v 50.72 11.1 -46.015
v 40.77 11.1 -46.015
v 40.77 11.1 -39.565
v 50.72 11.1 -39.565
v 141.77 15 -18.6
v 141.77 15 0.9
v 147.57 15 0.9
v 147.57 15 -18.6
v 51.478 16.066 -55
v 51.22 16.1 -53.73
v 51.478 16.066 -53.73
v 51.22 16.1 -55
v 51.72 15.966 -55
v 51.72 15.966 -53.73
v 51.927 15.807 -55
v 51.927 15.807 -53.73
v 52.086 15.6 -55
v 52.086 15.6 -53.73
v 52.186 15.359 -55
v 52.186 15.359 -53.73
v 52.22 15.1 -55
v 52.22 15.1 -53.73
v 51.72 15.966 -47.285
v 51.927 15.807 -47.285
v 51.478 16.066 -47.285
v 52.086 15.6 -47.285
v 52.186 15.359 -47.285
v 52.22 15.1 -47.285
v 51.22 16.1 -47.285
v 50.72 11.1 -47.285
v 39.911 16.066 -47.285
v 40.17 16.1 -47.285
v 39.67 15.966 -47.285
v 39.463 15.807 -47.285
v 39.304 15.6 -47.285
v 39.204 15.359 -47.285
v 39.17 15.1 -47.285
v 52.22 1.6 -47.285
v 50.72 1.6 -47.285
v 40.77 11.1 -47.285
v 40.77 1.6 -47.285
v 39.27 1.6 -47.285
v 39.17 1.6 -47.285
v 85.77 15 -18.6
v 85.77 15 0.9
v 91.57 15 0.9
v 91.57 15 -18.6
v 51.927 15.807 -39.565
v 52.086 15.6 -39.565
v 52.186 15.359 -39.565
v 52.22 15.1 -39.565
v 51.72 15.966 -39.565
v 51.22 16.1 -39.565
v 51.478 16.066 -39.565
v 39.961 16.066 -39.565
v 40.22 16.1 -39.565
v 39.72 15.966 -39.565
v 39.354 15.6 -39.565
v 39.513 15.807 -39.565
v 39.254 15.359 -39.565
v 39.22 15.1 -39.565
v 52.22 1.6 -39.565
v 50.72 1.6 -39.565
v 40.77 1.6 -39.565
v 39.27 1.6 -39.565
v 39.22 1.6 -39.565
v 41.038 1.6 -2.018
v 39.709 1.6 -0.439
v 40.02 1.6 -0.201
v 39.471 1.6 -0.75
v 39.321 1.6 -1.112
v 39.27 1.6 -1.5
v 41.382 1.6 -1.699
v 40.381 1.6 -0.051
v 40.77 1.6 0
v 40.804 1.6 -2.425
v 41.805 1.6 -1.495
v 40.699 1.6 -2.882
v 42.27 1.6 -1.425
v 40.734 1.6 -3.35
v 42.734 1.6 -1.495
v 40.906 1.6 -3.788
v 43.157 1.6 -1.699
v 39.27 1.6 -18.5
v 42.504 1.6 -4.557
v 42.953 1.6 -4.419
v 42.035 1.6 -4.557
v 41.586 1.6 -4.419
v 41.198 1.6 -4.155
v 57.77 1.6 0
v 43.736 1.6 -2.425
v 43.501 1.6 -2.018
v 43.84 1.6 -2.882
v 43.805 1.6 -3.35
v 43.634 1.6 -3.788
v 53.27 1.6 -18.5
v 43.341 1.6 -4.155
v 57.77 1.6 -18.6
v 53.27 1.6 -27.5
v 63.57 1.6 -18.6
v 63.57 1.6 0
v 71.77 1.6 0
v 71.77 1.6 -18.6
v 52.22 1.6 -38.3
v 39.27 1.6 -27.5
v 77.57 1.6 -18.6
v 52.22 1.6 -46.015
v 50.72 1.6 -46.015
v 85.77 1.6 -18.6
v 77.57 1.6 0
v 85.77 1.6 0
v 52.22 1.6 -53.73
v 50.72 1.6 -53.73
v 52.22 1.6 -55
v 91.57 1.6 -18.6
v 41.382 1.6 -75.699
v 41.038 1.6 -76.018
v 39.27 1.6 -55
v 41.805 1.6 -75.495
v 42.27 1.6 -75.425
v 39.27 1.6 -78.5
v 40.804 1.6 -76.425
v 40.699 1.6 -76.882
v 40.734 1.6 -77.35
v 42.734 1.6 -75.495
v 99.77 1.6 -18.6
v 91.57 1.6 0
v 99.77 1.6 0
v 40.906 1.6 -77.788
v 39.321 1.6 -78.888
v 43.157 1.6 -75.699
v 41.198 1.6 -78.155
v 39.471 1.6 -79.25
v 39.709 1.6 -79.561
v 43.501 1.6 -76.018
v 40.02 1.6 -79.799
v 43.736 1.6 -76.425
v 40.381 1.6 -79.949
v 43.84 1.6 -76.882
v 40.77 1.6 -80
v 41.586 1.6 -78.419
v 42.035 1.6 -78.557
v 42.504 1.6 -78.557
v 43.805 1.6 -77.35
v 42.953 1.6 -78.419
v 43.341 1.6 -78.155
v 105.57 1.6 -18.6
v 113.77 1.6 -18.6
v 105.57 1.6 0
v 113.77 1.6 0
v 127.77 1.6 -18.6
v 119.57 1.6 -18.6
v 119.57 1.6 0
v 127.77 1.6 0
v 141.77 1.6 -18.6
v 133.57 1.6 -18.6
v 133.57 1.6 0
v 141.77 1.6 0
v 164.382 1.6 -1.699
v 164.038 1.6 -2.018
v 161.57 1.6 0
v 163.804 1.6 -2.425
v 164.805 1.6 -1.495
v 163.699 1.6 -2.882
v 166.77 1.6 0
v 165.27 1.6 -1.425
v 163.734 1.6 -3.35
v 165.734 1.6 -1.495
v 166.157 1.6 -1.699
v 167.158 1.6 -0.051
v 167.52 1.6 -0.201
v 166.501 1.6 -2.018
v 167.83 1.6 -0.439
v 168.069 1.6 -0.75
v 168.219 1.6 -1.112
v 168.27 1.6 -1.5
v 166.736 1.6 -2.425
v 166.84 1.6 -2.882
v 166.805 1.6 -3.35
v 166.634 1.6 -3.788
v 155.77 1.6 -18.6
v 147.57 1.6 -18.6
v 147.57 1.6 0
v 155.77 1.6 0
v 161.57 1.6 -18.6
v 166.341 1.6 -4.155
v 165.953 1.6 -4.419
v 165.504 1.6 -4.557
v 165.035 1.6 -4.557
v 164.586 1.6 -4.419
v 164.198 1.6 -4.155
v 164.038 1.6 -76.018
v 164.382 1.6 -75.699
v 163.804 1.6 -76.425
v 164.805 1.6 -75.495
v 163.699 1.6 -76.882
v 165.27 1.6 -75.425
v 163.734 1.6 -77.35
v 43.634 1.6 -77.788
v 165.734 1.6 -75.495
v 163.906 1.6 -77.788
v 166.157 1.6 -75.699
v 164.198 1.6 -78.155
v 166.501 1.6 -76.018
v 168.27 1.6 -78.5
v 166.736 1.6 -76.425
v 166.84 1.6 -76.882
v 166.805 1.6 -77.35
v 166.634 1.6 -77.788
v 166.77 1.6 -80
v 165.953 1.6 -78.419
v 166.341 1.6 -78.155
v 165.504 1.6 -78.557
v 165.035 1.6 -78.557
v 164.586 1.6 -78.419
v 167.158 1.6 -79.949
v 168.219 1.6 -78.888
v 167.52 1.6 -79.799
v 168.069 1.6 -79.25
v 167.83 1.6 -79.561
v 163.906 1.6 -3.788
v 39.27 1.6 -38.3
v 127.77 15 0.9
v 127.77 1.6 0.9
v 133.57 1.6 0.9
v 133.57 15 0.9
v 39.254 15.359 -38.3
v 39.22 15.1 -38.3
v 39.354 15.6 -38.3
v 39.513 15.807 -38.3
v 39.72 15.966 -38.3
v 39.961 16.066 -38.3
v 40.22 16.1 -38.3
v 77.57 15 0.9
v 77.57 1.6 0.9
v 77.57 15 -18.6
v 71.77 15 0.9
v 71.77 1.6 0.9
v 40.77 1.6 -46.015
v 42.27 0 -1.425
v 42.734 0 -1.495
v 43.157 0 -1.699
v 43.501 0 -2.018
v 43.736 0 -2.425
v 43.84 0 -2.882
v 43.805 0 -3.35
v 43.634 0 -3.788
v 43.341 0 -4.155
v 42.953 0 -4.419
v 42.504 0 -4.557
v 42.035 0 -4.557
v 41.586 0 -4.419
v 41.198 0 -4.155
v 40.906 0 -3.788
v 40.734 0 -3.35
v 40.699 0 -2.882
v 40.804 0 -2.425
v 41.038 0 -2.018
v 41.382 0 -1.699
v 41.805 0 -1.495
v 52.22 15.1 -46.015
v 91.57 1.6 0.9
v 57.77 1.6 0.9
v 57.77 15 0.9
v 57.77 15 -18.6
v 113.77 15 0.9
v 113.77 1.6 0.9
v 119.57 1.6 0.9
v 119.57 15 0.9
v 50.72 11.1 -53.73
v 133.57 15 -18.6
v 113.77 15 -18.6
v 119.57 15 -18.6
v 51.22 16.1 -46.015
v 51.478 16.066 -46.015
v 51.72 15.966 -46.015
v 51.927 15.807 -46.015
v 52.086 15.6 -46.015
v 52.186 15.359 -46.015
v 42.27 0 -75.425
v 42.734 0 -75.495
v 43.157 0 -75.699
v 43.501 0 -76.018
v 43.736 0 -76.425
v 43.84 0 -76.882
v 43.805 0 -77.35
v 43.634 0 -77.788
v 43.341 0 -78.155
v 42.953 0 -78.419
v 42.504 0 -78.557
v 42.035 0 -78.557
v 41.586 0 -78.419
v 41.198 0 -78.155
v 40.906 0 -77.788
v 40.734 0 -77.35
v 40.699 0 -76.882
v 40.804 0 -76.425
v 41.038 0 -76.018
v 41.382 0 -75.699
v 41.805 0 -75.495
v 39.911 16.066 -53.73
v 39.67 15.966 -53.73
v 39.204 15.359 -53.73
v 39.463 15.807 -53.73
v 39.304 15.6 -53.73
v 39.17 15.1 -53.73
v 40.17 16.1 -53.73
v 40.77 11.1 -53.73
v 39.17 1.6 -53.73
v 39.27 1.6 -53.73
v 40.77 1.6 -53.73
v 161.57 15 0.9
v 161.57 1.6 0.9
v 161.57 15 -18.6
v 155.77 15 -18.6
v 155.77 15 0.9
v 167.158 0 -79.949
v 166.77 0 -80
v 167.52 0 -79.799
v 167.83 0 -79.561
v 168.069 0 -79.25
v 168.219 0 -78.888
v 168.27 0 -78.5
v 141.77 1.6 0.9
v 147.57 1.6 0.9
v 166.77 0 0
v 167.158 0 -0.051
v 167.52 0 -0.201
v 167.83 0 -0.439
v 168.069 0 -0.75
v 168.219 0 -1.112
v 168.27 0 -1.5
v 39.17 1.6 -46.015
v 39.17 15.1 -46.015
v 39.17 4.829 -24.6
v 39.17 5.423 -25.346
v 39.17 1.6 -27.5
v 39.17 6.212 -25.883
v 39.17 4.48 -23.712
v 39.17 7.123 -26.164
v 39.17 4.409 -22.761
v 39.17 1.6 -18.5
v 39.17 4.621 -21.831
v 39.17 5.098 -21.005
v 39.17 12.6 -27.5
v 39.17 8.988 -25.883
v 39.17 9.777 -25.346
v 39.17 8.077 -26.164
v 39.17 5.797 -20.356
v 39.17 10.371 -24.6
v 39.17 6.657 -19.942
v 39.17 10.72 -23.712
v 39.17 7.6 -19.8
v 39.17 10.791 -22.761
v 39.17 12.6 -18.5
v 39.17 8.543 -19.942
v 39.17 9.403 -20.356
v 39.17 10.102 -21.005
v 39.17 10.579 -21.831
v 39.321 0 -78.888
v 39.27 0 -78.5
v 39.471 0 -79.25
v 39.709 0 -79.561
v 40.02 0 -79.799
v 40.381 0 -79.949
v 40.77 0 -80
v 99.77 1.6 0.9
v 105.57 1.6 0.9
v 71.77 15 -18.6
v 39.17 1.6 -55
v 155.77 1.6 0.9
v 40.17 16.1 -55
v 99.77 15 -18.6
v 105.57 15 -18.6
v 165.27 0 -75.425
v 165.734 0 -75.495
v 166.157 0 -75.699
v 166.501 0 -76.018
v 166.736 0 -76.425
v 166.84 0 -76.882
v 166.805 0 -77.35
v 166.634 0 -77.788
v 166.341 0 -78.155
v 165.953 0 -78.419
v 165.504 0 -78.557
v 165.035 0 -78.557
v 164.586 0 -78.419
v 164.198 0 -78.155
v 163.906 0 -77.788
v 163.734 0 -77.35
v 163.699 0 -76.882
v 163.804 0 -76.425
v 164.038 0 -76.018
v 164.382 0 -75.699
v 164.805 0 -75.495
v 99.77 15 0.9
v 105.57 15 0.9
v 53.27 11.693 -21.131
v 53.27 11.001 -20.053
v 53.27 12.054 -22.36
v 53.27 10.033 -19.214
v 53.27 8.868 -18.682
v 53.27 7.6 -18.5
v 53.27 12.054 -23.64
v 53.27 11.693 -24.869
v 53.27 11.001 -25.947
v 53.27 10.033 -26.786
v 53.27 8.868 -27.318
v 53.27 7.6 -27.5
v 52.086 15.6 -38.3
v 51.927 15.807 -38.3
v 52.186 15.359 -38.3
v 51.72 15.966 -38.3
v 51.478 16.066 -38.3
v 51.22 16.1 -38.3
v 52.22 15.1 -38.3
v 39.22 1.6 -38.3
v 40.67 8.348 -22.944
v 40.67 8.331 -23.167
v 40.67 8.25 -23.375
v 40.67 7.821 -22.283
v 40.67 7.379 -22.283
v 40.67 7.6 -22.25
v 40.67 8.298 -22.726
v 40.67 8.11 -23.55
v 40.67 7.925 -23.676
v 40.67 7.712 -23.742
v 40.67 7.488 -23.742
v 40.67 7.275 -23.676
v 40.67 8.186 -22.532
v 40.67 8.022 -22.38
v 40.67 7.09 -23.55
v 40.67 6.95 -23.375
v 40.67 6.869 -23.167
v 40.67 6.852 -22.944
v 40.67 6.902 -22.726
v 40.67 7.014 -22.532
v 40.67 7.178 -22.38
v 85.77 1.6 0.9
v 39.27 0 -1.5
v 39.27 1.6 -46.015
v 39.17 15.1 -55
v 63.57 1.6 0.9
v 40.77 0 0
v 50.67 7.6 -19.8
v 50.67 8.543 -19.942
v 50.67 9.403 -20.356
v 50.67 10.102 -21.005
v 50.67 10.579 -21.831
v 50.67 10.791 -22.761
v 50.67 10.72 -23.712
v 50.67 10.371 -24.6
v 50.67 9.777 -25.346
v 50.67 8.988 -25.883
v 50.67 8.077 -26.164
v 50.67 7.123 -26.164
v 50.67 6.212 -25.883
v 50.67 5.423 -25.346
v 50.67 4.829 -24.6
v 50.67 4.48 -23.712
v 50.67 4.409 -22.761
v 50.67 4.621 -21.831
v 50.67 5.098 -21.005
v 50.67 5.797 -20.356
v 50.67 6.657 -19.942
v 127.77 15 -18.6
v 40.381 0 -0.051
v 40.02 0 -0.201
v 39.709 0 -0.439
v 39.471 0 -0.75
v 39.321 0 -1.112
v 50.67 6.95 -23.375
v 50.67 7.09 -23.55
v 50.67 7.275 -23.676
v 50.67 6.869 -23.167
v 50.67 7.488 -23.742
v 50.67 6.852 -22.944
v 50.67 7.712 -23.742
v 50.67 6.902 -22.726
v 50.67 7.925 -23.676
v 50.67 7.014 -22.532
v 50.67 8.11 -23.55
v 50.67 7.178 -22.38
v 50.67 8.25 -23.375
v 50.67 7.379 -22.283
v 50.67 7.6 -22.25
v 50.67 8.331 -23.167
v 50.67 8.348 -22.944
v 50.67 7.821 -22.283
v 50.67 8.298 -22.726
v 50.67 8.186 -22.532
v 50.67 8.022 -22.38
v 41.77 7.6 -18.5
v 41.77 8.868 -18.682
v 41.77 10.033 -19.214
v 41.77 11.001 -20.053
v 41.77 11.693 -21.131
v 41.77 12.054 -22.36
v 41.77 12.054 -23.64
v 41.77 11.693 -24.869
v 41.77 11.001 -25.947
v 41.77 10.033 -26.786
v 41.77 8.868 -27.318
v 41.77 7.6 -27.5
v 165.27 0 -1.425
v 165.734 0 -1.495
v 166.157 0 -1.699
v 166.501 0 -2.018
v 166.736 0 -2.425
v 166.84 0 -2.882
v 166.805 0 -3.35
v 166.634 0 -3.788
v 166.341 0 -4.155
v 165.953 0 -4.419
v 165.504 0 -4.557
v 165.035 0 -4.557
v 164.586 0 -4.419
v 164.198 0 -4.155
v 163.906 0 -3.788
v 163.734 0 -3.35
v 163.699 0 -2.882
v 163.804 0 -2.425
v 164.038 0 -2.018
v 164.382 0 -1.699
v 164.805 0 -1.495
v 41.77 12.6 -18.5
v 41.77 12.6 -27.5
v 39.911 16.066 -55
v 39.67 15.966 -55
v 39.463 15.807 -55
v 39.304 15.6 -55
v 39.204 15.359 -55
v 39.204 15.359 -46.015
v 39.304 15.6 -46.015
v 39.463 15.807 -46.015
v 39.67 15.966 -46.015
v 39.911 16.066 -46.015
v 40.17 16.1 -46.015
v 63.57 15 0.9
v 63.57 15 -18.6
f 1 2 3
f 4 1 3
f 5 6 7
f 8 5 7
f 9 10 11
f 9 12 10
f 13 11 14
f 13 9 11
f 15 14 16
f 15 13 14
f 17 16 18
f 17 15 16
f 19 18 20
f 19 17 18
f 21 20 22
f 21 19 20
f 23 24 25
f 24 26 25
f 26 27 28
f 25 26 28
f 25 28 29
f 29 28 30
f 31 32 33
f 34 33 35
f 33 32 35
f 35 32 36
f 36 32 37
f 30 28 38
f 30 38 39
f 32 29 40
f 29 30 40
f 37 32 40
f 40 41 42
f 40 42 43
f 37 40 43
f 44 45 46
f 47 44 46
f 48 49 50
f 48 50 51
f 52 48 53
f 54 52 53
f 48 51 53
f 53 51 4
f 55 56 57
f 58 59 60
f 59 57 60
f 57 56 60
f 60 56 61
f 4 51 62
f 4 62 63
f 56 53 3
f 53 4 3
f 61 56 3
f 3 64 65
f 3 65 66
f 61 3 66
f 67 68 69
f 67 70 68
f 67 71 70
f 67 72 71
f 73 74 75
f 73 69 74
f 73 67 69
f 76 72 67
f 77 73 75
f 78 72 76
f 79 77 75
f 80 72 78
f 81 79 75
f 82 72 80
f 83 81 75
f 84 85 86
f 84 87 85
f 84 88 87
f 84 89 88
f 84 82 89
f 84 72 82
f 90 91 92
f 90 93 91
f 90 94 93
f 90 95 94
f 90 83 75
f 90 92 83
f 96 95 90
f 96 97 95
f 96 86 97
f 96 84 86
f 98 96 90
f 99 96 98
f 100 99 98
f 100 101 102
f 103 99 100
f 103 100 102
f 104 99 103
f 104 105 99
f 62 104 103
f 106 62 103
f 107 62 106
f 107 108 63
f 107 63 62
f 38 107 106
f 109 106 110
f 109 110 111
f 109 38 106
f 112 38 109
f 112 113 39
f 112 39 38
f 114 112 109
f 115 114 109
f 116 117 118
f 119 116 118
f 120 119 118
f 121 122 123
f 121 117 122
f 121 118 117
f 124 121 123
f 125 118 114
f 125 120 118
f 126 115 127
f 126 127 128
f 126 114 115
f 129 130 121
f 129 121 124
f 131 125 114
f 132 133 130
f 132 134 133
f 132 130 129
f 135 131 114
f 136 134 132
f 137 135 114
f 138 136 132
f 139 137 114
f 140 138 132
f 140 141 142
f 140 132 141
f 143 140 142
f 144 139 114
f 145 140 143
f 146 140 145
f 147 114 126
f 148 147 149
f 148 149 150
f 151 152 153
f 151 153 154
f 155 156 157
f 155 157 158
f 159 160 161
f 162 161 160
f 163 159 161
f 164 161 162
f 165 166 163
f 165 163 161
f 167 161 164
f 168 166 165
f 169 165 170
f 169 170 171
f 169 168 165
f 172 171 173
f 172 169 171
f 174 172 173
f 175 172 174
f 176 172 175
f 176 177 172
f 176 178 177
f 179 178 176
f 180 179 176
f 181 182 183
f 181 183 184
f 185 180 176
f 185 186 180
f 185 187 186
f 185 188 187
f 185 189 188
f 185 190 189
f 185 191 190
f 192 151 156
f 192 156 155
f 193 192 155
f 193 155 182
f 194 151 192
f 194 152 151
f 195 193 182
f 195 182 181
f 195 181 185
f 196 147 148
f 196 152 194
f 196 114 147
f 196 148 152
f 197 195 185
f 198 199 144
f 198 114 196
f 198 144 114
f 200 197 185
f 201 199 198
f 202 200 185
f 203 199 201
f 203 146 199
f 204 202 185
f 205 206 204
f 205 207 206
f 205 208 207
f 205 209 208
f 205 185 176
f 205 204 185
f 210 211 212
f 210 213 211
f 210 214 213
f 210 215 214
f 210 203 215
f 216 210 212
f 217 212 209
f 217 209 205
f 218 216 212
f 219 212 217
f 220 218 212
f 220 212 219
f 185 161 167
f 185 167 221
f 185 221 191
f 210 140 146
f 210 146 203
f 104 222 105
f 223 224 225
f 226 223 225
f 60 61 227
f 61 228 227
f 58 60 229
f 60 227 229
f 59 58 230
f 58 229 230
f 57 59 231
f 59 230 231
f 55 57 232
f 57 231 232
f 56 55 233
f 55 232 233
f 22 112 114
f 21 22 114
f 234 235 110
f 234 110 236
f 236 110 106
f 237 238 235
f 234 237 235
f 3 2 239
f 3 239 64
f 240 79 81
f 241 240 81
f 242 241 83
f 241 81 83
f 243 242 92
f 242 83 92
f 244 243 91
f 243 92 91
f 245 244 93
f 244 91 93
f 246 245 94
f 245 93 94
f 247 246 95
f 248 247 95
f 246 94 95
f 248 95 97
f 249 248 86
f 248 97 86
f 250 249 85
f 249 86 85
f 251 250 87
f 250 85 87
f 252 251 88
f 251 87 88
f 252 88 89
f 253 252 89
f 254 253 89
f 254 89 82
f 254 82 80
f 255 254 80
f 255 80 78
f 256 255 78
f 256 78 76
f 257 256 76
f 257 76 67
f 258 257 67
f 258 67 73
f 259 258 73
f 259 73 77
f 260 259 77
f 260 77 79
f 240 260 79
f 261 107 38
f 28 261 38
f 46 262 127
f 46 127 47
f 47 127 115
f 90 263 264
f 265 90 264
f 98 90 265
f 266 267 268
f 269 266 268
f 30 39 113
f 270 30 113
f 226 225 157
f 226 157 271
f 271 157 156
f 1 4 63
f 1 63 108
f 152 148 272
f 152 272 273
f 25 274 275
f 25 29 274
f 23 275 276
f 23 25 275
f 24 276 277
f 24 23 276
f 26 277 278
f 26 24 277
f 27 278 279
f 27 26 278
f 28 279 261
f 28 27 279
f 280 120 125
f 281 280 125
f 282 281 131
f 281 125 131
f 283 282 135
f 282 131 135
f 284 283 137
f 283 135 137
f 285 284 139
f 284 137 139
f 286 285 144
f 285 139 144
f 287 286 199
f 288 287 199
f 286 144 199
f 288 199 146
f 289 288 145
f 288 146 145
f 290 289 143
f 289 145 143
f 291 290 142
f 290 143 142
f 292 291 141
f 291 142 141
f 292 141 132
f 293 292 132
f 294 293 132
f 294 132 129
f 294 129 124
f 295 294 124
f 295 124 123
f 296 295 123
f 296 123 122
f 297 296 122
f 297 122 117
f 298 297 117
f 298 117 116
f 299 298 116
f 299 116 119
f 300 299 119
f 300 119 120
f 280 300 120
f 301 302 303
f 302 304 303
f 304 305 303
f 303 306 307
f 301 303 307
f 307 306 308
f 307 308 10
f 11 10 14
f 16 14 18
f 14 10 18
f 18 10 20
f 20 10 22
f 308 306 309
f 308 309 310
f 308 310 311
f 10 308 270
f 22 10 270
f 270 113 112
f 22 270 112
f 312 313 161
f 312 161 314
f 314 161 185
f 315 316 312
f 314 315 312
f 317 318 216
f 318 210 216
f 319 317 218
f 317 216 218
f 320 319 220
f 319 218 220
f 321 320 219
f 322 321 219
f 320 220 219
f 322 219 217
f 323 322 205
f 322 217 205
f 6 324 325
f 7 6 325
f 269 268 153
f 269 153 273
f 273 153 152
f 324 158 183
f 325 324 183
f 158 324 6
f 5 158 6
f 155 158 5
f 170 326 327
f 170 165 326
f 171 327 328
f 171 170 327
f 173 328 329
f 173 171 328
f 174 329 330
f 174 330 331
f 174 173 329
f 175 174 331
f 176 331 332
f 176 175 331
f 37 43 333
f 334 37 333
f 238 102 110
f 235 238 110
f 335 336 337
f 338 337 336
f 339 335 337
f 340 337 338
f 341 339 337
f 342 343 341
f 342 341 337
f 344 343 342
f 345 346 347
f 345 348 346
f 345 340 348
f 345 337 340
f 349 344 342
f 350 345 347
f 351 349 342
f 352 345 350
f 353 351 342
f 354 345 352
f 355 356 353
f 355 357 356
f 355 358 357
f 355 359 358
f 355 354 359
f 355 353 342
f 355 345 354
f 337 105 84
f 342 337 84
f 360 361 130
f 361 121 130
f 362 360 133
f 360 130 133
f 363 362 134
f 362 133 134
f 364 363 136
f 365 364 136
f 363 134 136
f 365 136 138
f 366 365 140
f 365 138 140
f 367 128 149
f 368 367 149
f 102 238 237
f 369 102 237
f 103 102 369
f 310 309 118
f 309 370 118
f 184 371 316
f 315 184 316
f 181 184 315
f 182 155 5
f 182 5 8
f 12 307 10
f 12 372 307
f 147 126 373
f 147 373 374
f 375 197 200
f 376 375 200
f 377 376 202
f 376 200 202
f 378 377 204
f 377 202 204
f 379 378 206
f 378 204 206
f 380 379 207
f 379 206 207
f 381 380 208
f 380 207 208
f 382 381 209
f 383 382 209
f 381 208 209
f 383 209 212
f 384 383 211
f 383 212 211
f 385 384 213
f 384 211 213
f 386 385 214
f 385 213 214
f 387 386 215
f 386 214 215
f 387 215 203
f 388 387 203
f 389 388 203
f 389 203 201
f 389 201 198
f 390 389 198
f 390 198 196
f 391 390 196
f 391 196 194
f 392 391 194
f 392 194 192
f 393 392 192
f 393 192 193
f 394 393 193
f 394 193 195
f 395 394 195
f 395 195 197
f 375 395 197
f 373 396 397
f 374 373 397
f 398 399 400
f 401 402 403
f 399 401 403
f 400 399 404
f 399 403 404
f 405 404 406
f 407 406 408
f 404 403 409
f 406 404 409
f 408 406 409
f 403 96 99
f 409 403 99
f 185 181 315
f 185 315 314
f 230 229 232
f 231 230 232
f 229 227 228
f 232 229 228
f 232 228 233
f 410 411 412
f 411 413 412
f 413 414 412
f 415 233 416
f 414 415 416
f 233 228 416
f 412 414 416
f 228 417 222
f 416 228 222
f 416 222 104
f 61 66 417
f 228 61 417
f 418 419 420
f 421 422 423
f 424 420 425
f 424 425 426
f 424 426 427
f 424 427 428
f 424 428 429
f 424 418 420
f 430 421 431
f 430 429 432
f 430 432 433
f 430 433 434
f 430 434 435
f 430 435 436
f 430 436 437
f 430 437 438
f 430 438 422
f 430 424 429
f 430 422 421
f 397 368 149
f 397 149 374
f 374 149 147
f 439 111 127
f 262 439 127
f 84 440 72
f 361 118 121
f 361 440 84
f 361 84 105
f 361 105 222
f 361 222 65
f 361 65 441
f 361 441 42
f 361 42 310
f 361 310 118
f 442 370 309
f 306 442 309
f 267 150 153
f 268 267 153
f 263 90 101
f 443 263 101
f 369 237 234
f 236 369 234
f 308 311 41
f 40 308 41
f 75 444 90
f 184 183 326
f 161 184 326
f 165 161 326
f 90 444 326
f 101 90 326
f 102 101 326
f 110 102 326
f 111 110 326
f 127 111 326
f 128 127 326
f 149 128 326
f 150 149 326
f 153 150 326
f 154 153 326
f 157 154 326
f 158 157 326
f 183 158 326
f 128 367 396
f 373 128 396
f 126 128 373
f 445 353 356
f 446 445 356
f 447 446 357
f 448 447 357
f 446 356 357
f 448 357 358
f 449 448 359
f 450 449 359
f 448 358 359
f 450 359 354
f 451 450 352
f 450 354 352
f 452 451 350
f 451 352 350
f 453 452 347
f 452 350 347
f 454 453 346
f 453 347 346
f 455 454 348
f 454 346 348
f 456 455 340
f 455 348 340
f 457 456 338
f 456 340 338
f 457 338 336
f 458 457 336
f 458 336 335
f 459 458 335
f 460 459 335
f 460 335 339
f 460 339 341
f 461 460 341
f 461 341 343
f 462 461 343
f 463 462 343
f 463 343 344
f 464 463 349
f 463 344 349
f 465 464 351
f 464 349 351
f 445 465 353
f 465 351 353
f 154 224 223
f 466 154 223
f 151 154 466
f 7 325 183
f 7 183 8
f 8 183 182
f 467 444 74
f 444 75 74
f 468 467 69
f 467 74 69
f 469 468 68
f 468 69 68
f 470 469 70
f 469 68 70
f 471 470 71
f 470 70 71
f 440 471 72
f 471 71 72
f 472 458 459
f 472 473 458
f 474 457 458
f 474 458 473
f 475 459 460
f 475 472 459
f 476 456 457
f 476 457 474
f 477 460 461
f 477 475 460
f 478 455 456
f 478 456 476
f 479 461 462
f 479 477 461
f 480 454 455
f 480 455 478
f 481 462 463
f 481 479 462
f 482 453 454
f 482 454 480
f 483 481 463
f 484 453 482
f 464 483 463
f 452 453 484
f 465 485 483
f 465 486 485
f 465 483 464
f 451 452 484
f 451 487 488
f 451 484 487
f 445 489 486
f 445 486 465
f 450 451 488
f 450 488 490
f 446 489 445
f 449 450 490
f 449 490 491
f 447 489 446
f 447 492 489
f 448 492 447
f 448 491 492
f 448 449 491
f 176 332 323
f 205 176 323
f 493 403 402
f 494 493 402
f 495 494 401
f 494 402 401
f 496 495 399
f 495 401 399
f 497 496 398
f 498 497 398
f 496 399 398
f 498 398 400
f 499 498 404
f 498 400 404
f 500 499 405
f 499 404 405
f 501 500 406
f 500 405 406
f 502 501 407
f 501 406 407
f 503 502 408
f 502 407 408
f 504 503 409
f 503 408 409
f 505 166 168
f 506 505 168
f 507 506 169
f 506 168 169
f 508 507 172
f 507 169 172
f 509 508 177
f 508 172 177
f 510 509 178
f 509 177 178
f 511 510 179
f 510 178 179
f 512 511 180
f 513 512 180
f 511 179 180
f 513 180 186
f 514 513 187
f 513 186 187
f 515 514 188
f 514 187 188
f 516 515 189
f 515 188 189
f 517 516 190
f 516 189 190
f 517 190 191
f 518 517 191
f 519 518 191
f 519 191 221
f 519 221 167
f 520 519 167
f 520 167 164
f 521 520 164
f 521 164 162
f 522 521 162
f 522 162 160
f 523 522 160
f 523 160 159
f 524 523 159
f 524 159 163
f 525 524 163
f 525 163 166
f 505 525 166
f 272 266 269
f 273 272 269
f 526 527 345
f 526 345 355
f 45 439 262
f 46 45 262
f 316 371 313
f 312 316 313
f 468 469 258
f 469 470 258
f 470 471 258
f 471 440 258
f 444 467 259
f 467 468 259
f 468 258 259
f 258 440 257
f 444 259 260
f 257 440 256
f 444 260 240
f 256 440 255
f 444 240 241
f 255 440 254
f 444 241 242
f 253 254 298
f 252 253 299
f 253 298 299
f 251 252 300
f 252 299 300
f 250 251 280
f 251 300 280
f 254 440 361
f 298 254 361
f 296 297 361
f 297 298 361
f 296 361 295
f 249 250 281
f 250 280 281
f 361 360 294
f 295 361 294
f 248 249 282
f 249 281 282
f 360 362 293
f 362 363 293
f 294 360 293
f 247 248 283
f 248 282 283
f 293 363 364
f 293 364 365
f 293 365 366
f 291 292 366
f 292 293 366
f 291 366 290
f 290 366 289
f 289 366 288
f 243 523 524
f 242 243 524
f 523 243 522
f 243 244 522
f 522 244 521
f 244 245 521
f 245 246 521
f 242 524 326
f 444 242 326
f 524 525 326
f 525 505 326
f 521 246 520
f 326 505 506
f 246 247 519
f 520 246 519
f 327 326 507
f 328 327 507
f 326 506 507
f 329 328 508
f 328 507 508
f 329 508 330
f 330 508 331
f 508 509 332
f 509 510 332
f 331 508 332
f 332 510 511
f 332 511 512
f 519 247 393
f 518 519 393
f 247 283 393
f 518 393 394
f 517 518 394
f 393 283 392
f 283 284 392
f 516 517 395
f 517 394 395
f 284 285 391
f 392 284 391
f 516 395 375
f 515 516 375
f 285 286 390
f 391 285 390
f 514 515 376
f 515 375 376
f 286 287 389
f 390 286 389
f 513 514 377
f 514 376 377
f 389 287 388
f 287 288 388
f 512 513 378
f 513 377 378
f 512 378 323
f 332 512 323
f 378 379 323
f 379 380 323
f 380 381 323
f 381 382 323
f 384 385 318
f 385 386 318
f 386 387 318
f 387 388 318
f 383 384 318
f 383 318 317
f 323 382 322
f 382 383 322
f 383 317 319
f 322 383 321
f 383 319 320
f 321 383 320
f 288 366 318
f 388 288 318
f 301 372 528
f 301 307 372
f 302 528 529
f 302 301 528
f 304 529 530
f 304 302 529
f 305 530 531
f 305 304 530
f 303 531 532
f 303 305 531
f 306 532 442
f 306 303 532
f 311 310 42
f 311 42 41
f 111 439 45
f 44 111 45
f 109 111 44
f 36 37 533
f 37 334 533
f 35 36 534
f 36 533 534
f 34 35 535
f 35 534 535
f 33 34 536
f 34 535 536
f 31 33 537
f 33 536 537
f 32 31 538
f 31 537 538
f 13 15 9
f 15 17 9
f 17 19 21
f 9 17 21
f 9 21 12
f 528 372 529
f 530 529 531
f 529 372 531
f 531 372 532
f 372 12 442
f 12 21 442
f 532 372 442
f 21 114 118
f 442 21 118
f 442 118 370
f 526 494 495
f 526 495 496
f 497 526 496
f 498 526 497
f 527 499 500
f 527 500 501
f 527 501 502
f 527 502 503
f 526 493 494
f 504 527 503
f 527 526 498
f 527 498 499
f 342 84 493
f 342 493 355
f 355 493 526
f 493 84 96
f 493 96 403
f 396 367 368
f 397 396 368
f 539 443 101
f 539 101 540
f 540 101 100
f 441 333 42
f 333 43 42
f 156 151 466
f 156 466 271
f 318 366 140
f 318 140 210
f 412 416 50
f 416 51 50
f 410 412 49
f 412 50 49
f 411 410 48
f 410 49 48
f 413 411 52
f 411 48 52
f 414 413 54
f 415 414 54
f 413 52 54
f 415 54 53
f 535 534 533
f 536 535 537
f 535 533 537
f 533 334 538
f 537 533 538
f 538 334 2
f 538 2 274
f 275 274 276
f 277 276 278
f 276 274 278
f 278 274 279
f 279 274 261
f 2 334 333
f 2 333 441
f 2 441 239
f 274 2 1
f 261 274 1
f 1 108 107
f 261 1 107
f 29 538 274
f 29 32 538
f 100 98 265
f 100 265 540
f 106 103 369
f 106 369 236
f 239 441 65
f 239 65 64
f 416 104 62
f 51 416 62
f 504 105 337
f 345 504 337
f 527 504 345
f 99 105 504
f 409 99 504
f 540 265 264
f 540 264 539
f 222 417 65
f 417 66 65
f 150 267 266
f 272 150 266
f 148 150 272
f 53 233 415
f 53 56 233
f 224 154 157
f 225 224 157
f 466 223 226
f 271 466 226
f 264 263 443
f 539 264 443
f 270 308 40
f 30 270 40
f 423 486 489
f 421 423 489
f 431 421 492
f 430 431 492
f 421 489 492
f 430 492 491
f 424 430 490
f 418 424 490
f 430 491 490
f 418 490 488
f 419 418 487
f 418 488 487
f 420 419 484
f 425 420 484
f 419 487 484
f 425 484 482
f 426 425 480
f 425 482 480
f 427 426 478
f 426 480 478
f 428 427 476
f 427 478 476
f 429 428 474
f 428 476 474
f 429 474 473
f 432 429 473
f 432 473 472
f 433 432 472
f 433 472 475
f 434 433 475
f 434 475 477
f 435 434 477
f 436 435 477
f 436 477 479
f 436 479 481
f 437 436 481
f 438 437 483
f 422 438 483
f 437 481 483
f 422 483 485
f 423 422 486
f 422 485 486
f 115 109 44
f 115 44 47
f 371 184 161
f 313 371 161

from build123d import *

# Parameters (mm, degrees)
SKETCH_1_W          = 129
SKETCH_1_H          = 80
EXTRUDE_1_DEPTH     = 1.6
SKETCH_2_R          = 1.575
CUT_EXTRUDE_1_DEPTH = 187.325625148
SKETCH_3_W          = 5.8
SKETCH_3_H          = 19.5
EXTRUDE_2_DEPTH     = 13.4
FILLET_1_R          = 1.5
SKETCH_4_W          = 14
SKETCH_4_H          = 9
EXTRUDE_3_DEPTH     = 11
SKETCH_5_W          = 9
SKETCH_5_H          = 11
EXTRUDE_4_DEPTH     = 0.1
CUT_EXTRUDE_2_DEPTH = 11.5
SKETCH_7_R          = 3.2
CUT_EXTRUDE_3_DEPTH = 11.5
SKETCH_8_R          = 0.75
EXTRUDE_5_DEPTH     = 10
EXTRUDE_6_DEPTH     = 14.5
SKETCH_10_W         = 6.45
SKETCH_10_H         = 5
SKETCH_10_W_2       = 6.445
CUT_EXTRUDE_4_DEPTH = 14.5
FILLET_2_R          = 1


with BuildPart() as part:
    # 草图1 → 凸台-拉伸1 (new body)
    with BuildSketch(Plane(origin=(0, 0, 0), x_dir=(1, 0, 0), z_dir=(0, 1, 0))):
        with Locations((103.769660327, 40)):
            Rectangle(SKETCH_1_W, SKETCH_1_H)
    extrude(amount=EXTRUDE_1_DEPTH)

    # 草图2 → 切除-拉伸1 (cut, through all)
    with BuildSketch(Plane(origin=(0, 1.6, 0), x_dir=(1, 0, 0), z_dir=(0, 1, 0))):
        with Locations(Location((42.269660327, 77, 0), (0, 0, 270))):
            Circle(SKETCH_2_R)
        with Locations(Location((42.269660327, 3, 0), (0, 0, 270))):
            Circle(SKETCH_2_R)
        with Locations(Location((165.269660327, 3, 0), (0, 0, 270))):
            Circle(SKETCH_2_R)
        with Locations(Location((165.269660327, 77, 0), (0, 0, 270))):
            Circle(SKETCH_2_R)
    extrude(amount=-CUT_EXTRUDE_1_DEPTH, mode=Mode.SUBTRACT)

    # 草图3 → 凸台-拉伸2 (add)
    with BuildSketch(Plane(origin=(0, 1.6, 0), x_dir=(1, 0, 0), z_dir=(0, 1, 0))):
        with Locations((158.669660327, 8.85)):
            Rectangle(SKETCH_3_W, SKETCH_3_H)
        with Locations((144.669660327, 8.85)):
            Rectangle(SKETCH_3_W, SKETCH_3_H)
        with Locations((130.669660327, 8.85)):
            Rectangle(SKETCH_3_W, SKETCH_3_H)
        with Locations((116.669660327, 8.85)):
            Rectangle(SKETCH_3_W, SKETCH_3_H)
        with Locations((102.669660327, 8.85)):
            Rectangle(SKETCH_3_W, SKETCH_3_H)
        with Locations((88.669660327, 8.85)):
            Rectangle(SKETCH_3_W, SKETCH_3_H)
        with Locations((74.669660327, 8.85)):
            Rectangle(SKETCH_3_W, SKETCH_3_H)
        with Locations((60.669660327, 8.85)):
            Rectangle(SKETCH_3_W, SKETCH_3_H)
    extrude(amount=EXTRUDE_2_DEPTH)

    # 圆角1
    fillet_1_edges = [part.edges().sort_by_distance(p)[0] for p in [
        (168.269660327, 0.8, -80),
        (168.269660327, 0.8, 0),
        (39.269660327, 0.8, 0),
        (39.269660327, 0.8, -80),
    ]]
    fillet(fillet_1_edges, radius=FILLET_1_R)

    # 草图4 → 凸台-拉伸3 (add)
    with BuildSketch(Plane(origin=(0, 1.6, 0), x_dir=(1, 0, 0), z_dir=(0, 1, 0))):
        with Locations((46.269660327, 23)):
            Rectangle(SKETCH_4_W, SKETCH_4_H)
    extrude(amount=EXTRUDE_3_DEPTH)

    # 草图5 → 凸台-拉伸4 (add)
    with BuildSketch(Plane.ZY.offset(-39.269660327)):
        with Locations((-23, 7.1)):
            Rectangle(SKETCH_5_W, SKETCH_5_H)
    extrude(amount=EXTRUDE_4_DEPTH)

    # 草图6 → 切除-拉伸2 (cut)
    with BuildSketch(Plane(origin=(53.269660327, 0, 0), x_dir=(0, 0, -1), z_dir=(1, 0, 0))):
        with BuildLine():
            Line((18.5, 12.6), (18.5, 7.6))
            ThreePointArc((18.5, 7.6), (23, 12.1), (27.5, 7.6))
            Line((27.5, 7.6), (27.5, 12.6))
            Line((27.5, 12.6), (18.5, 12.6))
        make_face()
    extrude(amount=-CUT_EXTRUDE_2_DEPTH, mode=Mode.SUBTRACT)

    # 草图7 → 切除-拉伸3 (cut)
    with BuildSketch(Plane.ZY.offset(-39.169660327)):
        with Locations((-23, 7.6)):
            Circle(SKETCH_7_R)
    extrude(amount=-CUT_EXTRUDE_3_DEPTH, mode=Mode.SUBTRACT)

    # 草图8 → 凸台-拉伸5 (add)
    with BuildSketch(Plane.ZY.offset(-50.669660327)):
        with Locations((-23, 7.6)):
            Circle(SKETCH_8_R)
    extrude(amount=EXTRUDE_5_DEPTH)

    # 草图9 → 凸台-拉伸6 (add)
    with BuildSketch(Plane(origin=(0, 1.6, 0), x_dir=(1, 0, 0), z_dir=(0, 1, 0))):
        Polygon((39.269660327, 38.3), (52.219660327, 38.3), (52.219660327, 39.565), (50.719660327, 39.565), (50.719660327, 46.015), (52.219660327, 46.015), (52.219660327, 47.285), (50.719660327, 47.285), (50.719660327, 53.73), (52.219660327, 53.73), (52.219660327, 55), (39.269660327, 55), (39.169660327, 55), (39.169660327, 53.73), (39.269660327, 53.73), (40.769660327, 53.73), (40.769660327, 47.285), (39.269660327, 47.285), (39.169660327, 47.285), (39.169660327, 46.015), (39.269660327, 46.015), (40.769660327, 46.015), (40.769660327, 39.565), (39.269660327, 39.565), (39.219660327, 39.565), (39.219660327, 38.3), align=None)
    extrude(amount=EXTRUDE_6_DEPTH)

    # 草图10 → 切除-拉伸4 (cut)
    with BuildSketch(Plane.ZY.offset(-39.219660327)):
        with Locations((-42.79, 13.6)):
            Rectangle(SKETCH_10_W, SKETCH_10_H)
        with Locations((-50.5075, 13.6)):
            Rectangle(SKETCH_10_W_2, SKETCH_10_H)
    extrude(amount=-CUT_EXTRUDE_4_DEPTH, mode=Mode.SUBTRACT)

    # 圆角2
    fillet_2_edges = [part.edges().sort_by_distance(p)[0] for p in [
        (39.169660327, 16.1, -46.65),
        (39.219660327, 16.1, -38.9325),
        (52.219660327, 16.1, -38.9325),
        (52.219660327, 16.1, -46.65),
        (52.219660327, 16.1, -54.365),
        (39.169660327, 16.1, -54.365),
    ]]
    fillet(fillet_2_edges, radius=FILLET_2_R)


solid = part.part
